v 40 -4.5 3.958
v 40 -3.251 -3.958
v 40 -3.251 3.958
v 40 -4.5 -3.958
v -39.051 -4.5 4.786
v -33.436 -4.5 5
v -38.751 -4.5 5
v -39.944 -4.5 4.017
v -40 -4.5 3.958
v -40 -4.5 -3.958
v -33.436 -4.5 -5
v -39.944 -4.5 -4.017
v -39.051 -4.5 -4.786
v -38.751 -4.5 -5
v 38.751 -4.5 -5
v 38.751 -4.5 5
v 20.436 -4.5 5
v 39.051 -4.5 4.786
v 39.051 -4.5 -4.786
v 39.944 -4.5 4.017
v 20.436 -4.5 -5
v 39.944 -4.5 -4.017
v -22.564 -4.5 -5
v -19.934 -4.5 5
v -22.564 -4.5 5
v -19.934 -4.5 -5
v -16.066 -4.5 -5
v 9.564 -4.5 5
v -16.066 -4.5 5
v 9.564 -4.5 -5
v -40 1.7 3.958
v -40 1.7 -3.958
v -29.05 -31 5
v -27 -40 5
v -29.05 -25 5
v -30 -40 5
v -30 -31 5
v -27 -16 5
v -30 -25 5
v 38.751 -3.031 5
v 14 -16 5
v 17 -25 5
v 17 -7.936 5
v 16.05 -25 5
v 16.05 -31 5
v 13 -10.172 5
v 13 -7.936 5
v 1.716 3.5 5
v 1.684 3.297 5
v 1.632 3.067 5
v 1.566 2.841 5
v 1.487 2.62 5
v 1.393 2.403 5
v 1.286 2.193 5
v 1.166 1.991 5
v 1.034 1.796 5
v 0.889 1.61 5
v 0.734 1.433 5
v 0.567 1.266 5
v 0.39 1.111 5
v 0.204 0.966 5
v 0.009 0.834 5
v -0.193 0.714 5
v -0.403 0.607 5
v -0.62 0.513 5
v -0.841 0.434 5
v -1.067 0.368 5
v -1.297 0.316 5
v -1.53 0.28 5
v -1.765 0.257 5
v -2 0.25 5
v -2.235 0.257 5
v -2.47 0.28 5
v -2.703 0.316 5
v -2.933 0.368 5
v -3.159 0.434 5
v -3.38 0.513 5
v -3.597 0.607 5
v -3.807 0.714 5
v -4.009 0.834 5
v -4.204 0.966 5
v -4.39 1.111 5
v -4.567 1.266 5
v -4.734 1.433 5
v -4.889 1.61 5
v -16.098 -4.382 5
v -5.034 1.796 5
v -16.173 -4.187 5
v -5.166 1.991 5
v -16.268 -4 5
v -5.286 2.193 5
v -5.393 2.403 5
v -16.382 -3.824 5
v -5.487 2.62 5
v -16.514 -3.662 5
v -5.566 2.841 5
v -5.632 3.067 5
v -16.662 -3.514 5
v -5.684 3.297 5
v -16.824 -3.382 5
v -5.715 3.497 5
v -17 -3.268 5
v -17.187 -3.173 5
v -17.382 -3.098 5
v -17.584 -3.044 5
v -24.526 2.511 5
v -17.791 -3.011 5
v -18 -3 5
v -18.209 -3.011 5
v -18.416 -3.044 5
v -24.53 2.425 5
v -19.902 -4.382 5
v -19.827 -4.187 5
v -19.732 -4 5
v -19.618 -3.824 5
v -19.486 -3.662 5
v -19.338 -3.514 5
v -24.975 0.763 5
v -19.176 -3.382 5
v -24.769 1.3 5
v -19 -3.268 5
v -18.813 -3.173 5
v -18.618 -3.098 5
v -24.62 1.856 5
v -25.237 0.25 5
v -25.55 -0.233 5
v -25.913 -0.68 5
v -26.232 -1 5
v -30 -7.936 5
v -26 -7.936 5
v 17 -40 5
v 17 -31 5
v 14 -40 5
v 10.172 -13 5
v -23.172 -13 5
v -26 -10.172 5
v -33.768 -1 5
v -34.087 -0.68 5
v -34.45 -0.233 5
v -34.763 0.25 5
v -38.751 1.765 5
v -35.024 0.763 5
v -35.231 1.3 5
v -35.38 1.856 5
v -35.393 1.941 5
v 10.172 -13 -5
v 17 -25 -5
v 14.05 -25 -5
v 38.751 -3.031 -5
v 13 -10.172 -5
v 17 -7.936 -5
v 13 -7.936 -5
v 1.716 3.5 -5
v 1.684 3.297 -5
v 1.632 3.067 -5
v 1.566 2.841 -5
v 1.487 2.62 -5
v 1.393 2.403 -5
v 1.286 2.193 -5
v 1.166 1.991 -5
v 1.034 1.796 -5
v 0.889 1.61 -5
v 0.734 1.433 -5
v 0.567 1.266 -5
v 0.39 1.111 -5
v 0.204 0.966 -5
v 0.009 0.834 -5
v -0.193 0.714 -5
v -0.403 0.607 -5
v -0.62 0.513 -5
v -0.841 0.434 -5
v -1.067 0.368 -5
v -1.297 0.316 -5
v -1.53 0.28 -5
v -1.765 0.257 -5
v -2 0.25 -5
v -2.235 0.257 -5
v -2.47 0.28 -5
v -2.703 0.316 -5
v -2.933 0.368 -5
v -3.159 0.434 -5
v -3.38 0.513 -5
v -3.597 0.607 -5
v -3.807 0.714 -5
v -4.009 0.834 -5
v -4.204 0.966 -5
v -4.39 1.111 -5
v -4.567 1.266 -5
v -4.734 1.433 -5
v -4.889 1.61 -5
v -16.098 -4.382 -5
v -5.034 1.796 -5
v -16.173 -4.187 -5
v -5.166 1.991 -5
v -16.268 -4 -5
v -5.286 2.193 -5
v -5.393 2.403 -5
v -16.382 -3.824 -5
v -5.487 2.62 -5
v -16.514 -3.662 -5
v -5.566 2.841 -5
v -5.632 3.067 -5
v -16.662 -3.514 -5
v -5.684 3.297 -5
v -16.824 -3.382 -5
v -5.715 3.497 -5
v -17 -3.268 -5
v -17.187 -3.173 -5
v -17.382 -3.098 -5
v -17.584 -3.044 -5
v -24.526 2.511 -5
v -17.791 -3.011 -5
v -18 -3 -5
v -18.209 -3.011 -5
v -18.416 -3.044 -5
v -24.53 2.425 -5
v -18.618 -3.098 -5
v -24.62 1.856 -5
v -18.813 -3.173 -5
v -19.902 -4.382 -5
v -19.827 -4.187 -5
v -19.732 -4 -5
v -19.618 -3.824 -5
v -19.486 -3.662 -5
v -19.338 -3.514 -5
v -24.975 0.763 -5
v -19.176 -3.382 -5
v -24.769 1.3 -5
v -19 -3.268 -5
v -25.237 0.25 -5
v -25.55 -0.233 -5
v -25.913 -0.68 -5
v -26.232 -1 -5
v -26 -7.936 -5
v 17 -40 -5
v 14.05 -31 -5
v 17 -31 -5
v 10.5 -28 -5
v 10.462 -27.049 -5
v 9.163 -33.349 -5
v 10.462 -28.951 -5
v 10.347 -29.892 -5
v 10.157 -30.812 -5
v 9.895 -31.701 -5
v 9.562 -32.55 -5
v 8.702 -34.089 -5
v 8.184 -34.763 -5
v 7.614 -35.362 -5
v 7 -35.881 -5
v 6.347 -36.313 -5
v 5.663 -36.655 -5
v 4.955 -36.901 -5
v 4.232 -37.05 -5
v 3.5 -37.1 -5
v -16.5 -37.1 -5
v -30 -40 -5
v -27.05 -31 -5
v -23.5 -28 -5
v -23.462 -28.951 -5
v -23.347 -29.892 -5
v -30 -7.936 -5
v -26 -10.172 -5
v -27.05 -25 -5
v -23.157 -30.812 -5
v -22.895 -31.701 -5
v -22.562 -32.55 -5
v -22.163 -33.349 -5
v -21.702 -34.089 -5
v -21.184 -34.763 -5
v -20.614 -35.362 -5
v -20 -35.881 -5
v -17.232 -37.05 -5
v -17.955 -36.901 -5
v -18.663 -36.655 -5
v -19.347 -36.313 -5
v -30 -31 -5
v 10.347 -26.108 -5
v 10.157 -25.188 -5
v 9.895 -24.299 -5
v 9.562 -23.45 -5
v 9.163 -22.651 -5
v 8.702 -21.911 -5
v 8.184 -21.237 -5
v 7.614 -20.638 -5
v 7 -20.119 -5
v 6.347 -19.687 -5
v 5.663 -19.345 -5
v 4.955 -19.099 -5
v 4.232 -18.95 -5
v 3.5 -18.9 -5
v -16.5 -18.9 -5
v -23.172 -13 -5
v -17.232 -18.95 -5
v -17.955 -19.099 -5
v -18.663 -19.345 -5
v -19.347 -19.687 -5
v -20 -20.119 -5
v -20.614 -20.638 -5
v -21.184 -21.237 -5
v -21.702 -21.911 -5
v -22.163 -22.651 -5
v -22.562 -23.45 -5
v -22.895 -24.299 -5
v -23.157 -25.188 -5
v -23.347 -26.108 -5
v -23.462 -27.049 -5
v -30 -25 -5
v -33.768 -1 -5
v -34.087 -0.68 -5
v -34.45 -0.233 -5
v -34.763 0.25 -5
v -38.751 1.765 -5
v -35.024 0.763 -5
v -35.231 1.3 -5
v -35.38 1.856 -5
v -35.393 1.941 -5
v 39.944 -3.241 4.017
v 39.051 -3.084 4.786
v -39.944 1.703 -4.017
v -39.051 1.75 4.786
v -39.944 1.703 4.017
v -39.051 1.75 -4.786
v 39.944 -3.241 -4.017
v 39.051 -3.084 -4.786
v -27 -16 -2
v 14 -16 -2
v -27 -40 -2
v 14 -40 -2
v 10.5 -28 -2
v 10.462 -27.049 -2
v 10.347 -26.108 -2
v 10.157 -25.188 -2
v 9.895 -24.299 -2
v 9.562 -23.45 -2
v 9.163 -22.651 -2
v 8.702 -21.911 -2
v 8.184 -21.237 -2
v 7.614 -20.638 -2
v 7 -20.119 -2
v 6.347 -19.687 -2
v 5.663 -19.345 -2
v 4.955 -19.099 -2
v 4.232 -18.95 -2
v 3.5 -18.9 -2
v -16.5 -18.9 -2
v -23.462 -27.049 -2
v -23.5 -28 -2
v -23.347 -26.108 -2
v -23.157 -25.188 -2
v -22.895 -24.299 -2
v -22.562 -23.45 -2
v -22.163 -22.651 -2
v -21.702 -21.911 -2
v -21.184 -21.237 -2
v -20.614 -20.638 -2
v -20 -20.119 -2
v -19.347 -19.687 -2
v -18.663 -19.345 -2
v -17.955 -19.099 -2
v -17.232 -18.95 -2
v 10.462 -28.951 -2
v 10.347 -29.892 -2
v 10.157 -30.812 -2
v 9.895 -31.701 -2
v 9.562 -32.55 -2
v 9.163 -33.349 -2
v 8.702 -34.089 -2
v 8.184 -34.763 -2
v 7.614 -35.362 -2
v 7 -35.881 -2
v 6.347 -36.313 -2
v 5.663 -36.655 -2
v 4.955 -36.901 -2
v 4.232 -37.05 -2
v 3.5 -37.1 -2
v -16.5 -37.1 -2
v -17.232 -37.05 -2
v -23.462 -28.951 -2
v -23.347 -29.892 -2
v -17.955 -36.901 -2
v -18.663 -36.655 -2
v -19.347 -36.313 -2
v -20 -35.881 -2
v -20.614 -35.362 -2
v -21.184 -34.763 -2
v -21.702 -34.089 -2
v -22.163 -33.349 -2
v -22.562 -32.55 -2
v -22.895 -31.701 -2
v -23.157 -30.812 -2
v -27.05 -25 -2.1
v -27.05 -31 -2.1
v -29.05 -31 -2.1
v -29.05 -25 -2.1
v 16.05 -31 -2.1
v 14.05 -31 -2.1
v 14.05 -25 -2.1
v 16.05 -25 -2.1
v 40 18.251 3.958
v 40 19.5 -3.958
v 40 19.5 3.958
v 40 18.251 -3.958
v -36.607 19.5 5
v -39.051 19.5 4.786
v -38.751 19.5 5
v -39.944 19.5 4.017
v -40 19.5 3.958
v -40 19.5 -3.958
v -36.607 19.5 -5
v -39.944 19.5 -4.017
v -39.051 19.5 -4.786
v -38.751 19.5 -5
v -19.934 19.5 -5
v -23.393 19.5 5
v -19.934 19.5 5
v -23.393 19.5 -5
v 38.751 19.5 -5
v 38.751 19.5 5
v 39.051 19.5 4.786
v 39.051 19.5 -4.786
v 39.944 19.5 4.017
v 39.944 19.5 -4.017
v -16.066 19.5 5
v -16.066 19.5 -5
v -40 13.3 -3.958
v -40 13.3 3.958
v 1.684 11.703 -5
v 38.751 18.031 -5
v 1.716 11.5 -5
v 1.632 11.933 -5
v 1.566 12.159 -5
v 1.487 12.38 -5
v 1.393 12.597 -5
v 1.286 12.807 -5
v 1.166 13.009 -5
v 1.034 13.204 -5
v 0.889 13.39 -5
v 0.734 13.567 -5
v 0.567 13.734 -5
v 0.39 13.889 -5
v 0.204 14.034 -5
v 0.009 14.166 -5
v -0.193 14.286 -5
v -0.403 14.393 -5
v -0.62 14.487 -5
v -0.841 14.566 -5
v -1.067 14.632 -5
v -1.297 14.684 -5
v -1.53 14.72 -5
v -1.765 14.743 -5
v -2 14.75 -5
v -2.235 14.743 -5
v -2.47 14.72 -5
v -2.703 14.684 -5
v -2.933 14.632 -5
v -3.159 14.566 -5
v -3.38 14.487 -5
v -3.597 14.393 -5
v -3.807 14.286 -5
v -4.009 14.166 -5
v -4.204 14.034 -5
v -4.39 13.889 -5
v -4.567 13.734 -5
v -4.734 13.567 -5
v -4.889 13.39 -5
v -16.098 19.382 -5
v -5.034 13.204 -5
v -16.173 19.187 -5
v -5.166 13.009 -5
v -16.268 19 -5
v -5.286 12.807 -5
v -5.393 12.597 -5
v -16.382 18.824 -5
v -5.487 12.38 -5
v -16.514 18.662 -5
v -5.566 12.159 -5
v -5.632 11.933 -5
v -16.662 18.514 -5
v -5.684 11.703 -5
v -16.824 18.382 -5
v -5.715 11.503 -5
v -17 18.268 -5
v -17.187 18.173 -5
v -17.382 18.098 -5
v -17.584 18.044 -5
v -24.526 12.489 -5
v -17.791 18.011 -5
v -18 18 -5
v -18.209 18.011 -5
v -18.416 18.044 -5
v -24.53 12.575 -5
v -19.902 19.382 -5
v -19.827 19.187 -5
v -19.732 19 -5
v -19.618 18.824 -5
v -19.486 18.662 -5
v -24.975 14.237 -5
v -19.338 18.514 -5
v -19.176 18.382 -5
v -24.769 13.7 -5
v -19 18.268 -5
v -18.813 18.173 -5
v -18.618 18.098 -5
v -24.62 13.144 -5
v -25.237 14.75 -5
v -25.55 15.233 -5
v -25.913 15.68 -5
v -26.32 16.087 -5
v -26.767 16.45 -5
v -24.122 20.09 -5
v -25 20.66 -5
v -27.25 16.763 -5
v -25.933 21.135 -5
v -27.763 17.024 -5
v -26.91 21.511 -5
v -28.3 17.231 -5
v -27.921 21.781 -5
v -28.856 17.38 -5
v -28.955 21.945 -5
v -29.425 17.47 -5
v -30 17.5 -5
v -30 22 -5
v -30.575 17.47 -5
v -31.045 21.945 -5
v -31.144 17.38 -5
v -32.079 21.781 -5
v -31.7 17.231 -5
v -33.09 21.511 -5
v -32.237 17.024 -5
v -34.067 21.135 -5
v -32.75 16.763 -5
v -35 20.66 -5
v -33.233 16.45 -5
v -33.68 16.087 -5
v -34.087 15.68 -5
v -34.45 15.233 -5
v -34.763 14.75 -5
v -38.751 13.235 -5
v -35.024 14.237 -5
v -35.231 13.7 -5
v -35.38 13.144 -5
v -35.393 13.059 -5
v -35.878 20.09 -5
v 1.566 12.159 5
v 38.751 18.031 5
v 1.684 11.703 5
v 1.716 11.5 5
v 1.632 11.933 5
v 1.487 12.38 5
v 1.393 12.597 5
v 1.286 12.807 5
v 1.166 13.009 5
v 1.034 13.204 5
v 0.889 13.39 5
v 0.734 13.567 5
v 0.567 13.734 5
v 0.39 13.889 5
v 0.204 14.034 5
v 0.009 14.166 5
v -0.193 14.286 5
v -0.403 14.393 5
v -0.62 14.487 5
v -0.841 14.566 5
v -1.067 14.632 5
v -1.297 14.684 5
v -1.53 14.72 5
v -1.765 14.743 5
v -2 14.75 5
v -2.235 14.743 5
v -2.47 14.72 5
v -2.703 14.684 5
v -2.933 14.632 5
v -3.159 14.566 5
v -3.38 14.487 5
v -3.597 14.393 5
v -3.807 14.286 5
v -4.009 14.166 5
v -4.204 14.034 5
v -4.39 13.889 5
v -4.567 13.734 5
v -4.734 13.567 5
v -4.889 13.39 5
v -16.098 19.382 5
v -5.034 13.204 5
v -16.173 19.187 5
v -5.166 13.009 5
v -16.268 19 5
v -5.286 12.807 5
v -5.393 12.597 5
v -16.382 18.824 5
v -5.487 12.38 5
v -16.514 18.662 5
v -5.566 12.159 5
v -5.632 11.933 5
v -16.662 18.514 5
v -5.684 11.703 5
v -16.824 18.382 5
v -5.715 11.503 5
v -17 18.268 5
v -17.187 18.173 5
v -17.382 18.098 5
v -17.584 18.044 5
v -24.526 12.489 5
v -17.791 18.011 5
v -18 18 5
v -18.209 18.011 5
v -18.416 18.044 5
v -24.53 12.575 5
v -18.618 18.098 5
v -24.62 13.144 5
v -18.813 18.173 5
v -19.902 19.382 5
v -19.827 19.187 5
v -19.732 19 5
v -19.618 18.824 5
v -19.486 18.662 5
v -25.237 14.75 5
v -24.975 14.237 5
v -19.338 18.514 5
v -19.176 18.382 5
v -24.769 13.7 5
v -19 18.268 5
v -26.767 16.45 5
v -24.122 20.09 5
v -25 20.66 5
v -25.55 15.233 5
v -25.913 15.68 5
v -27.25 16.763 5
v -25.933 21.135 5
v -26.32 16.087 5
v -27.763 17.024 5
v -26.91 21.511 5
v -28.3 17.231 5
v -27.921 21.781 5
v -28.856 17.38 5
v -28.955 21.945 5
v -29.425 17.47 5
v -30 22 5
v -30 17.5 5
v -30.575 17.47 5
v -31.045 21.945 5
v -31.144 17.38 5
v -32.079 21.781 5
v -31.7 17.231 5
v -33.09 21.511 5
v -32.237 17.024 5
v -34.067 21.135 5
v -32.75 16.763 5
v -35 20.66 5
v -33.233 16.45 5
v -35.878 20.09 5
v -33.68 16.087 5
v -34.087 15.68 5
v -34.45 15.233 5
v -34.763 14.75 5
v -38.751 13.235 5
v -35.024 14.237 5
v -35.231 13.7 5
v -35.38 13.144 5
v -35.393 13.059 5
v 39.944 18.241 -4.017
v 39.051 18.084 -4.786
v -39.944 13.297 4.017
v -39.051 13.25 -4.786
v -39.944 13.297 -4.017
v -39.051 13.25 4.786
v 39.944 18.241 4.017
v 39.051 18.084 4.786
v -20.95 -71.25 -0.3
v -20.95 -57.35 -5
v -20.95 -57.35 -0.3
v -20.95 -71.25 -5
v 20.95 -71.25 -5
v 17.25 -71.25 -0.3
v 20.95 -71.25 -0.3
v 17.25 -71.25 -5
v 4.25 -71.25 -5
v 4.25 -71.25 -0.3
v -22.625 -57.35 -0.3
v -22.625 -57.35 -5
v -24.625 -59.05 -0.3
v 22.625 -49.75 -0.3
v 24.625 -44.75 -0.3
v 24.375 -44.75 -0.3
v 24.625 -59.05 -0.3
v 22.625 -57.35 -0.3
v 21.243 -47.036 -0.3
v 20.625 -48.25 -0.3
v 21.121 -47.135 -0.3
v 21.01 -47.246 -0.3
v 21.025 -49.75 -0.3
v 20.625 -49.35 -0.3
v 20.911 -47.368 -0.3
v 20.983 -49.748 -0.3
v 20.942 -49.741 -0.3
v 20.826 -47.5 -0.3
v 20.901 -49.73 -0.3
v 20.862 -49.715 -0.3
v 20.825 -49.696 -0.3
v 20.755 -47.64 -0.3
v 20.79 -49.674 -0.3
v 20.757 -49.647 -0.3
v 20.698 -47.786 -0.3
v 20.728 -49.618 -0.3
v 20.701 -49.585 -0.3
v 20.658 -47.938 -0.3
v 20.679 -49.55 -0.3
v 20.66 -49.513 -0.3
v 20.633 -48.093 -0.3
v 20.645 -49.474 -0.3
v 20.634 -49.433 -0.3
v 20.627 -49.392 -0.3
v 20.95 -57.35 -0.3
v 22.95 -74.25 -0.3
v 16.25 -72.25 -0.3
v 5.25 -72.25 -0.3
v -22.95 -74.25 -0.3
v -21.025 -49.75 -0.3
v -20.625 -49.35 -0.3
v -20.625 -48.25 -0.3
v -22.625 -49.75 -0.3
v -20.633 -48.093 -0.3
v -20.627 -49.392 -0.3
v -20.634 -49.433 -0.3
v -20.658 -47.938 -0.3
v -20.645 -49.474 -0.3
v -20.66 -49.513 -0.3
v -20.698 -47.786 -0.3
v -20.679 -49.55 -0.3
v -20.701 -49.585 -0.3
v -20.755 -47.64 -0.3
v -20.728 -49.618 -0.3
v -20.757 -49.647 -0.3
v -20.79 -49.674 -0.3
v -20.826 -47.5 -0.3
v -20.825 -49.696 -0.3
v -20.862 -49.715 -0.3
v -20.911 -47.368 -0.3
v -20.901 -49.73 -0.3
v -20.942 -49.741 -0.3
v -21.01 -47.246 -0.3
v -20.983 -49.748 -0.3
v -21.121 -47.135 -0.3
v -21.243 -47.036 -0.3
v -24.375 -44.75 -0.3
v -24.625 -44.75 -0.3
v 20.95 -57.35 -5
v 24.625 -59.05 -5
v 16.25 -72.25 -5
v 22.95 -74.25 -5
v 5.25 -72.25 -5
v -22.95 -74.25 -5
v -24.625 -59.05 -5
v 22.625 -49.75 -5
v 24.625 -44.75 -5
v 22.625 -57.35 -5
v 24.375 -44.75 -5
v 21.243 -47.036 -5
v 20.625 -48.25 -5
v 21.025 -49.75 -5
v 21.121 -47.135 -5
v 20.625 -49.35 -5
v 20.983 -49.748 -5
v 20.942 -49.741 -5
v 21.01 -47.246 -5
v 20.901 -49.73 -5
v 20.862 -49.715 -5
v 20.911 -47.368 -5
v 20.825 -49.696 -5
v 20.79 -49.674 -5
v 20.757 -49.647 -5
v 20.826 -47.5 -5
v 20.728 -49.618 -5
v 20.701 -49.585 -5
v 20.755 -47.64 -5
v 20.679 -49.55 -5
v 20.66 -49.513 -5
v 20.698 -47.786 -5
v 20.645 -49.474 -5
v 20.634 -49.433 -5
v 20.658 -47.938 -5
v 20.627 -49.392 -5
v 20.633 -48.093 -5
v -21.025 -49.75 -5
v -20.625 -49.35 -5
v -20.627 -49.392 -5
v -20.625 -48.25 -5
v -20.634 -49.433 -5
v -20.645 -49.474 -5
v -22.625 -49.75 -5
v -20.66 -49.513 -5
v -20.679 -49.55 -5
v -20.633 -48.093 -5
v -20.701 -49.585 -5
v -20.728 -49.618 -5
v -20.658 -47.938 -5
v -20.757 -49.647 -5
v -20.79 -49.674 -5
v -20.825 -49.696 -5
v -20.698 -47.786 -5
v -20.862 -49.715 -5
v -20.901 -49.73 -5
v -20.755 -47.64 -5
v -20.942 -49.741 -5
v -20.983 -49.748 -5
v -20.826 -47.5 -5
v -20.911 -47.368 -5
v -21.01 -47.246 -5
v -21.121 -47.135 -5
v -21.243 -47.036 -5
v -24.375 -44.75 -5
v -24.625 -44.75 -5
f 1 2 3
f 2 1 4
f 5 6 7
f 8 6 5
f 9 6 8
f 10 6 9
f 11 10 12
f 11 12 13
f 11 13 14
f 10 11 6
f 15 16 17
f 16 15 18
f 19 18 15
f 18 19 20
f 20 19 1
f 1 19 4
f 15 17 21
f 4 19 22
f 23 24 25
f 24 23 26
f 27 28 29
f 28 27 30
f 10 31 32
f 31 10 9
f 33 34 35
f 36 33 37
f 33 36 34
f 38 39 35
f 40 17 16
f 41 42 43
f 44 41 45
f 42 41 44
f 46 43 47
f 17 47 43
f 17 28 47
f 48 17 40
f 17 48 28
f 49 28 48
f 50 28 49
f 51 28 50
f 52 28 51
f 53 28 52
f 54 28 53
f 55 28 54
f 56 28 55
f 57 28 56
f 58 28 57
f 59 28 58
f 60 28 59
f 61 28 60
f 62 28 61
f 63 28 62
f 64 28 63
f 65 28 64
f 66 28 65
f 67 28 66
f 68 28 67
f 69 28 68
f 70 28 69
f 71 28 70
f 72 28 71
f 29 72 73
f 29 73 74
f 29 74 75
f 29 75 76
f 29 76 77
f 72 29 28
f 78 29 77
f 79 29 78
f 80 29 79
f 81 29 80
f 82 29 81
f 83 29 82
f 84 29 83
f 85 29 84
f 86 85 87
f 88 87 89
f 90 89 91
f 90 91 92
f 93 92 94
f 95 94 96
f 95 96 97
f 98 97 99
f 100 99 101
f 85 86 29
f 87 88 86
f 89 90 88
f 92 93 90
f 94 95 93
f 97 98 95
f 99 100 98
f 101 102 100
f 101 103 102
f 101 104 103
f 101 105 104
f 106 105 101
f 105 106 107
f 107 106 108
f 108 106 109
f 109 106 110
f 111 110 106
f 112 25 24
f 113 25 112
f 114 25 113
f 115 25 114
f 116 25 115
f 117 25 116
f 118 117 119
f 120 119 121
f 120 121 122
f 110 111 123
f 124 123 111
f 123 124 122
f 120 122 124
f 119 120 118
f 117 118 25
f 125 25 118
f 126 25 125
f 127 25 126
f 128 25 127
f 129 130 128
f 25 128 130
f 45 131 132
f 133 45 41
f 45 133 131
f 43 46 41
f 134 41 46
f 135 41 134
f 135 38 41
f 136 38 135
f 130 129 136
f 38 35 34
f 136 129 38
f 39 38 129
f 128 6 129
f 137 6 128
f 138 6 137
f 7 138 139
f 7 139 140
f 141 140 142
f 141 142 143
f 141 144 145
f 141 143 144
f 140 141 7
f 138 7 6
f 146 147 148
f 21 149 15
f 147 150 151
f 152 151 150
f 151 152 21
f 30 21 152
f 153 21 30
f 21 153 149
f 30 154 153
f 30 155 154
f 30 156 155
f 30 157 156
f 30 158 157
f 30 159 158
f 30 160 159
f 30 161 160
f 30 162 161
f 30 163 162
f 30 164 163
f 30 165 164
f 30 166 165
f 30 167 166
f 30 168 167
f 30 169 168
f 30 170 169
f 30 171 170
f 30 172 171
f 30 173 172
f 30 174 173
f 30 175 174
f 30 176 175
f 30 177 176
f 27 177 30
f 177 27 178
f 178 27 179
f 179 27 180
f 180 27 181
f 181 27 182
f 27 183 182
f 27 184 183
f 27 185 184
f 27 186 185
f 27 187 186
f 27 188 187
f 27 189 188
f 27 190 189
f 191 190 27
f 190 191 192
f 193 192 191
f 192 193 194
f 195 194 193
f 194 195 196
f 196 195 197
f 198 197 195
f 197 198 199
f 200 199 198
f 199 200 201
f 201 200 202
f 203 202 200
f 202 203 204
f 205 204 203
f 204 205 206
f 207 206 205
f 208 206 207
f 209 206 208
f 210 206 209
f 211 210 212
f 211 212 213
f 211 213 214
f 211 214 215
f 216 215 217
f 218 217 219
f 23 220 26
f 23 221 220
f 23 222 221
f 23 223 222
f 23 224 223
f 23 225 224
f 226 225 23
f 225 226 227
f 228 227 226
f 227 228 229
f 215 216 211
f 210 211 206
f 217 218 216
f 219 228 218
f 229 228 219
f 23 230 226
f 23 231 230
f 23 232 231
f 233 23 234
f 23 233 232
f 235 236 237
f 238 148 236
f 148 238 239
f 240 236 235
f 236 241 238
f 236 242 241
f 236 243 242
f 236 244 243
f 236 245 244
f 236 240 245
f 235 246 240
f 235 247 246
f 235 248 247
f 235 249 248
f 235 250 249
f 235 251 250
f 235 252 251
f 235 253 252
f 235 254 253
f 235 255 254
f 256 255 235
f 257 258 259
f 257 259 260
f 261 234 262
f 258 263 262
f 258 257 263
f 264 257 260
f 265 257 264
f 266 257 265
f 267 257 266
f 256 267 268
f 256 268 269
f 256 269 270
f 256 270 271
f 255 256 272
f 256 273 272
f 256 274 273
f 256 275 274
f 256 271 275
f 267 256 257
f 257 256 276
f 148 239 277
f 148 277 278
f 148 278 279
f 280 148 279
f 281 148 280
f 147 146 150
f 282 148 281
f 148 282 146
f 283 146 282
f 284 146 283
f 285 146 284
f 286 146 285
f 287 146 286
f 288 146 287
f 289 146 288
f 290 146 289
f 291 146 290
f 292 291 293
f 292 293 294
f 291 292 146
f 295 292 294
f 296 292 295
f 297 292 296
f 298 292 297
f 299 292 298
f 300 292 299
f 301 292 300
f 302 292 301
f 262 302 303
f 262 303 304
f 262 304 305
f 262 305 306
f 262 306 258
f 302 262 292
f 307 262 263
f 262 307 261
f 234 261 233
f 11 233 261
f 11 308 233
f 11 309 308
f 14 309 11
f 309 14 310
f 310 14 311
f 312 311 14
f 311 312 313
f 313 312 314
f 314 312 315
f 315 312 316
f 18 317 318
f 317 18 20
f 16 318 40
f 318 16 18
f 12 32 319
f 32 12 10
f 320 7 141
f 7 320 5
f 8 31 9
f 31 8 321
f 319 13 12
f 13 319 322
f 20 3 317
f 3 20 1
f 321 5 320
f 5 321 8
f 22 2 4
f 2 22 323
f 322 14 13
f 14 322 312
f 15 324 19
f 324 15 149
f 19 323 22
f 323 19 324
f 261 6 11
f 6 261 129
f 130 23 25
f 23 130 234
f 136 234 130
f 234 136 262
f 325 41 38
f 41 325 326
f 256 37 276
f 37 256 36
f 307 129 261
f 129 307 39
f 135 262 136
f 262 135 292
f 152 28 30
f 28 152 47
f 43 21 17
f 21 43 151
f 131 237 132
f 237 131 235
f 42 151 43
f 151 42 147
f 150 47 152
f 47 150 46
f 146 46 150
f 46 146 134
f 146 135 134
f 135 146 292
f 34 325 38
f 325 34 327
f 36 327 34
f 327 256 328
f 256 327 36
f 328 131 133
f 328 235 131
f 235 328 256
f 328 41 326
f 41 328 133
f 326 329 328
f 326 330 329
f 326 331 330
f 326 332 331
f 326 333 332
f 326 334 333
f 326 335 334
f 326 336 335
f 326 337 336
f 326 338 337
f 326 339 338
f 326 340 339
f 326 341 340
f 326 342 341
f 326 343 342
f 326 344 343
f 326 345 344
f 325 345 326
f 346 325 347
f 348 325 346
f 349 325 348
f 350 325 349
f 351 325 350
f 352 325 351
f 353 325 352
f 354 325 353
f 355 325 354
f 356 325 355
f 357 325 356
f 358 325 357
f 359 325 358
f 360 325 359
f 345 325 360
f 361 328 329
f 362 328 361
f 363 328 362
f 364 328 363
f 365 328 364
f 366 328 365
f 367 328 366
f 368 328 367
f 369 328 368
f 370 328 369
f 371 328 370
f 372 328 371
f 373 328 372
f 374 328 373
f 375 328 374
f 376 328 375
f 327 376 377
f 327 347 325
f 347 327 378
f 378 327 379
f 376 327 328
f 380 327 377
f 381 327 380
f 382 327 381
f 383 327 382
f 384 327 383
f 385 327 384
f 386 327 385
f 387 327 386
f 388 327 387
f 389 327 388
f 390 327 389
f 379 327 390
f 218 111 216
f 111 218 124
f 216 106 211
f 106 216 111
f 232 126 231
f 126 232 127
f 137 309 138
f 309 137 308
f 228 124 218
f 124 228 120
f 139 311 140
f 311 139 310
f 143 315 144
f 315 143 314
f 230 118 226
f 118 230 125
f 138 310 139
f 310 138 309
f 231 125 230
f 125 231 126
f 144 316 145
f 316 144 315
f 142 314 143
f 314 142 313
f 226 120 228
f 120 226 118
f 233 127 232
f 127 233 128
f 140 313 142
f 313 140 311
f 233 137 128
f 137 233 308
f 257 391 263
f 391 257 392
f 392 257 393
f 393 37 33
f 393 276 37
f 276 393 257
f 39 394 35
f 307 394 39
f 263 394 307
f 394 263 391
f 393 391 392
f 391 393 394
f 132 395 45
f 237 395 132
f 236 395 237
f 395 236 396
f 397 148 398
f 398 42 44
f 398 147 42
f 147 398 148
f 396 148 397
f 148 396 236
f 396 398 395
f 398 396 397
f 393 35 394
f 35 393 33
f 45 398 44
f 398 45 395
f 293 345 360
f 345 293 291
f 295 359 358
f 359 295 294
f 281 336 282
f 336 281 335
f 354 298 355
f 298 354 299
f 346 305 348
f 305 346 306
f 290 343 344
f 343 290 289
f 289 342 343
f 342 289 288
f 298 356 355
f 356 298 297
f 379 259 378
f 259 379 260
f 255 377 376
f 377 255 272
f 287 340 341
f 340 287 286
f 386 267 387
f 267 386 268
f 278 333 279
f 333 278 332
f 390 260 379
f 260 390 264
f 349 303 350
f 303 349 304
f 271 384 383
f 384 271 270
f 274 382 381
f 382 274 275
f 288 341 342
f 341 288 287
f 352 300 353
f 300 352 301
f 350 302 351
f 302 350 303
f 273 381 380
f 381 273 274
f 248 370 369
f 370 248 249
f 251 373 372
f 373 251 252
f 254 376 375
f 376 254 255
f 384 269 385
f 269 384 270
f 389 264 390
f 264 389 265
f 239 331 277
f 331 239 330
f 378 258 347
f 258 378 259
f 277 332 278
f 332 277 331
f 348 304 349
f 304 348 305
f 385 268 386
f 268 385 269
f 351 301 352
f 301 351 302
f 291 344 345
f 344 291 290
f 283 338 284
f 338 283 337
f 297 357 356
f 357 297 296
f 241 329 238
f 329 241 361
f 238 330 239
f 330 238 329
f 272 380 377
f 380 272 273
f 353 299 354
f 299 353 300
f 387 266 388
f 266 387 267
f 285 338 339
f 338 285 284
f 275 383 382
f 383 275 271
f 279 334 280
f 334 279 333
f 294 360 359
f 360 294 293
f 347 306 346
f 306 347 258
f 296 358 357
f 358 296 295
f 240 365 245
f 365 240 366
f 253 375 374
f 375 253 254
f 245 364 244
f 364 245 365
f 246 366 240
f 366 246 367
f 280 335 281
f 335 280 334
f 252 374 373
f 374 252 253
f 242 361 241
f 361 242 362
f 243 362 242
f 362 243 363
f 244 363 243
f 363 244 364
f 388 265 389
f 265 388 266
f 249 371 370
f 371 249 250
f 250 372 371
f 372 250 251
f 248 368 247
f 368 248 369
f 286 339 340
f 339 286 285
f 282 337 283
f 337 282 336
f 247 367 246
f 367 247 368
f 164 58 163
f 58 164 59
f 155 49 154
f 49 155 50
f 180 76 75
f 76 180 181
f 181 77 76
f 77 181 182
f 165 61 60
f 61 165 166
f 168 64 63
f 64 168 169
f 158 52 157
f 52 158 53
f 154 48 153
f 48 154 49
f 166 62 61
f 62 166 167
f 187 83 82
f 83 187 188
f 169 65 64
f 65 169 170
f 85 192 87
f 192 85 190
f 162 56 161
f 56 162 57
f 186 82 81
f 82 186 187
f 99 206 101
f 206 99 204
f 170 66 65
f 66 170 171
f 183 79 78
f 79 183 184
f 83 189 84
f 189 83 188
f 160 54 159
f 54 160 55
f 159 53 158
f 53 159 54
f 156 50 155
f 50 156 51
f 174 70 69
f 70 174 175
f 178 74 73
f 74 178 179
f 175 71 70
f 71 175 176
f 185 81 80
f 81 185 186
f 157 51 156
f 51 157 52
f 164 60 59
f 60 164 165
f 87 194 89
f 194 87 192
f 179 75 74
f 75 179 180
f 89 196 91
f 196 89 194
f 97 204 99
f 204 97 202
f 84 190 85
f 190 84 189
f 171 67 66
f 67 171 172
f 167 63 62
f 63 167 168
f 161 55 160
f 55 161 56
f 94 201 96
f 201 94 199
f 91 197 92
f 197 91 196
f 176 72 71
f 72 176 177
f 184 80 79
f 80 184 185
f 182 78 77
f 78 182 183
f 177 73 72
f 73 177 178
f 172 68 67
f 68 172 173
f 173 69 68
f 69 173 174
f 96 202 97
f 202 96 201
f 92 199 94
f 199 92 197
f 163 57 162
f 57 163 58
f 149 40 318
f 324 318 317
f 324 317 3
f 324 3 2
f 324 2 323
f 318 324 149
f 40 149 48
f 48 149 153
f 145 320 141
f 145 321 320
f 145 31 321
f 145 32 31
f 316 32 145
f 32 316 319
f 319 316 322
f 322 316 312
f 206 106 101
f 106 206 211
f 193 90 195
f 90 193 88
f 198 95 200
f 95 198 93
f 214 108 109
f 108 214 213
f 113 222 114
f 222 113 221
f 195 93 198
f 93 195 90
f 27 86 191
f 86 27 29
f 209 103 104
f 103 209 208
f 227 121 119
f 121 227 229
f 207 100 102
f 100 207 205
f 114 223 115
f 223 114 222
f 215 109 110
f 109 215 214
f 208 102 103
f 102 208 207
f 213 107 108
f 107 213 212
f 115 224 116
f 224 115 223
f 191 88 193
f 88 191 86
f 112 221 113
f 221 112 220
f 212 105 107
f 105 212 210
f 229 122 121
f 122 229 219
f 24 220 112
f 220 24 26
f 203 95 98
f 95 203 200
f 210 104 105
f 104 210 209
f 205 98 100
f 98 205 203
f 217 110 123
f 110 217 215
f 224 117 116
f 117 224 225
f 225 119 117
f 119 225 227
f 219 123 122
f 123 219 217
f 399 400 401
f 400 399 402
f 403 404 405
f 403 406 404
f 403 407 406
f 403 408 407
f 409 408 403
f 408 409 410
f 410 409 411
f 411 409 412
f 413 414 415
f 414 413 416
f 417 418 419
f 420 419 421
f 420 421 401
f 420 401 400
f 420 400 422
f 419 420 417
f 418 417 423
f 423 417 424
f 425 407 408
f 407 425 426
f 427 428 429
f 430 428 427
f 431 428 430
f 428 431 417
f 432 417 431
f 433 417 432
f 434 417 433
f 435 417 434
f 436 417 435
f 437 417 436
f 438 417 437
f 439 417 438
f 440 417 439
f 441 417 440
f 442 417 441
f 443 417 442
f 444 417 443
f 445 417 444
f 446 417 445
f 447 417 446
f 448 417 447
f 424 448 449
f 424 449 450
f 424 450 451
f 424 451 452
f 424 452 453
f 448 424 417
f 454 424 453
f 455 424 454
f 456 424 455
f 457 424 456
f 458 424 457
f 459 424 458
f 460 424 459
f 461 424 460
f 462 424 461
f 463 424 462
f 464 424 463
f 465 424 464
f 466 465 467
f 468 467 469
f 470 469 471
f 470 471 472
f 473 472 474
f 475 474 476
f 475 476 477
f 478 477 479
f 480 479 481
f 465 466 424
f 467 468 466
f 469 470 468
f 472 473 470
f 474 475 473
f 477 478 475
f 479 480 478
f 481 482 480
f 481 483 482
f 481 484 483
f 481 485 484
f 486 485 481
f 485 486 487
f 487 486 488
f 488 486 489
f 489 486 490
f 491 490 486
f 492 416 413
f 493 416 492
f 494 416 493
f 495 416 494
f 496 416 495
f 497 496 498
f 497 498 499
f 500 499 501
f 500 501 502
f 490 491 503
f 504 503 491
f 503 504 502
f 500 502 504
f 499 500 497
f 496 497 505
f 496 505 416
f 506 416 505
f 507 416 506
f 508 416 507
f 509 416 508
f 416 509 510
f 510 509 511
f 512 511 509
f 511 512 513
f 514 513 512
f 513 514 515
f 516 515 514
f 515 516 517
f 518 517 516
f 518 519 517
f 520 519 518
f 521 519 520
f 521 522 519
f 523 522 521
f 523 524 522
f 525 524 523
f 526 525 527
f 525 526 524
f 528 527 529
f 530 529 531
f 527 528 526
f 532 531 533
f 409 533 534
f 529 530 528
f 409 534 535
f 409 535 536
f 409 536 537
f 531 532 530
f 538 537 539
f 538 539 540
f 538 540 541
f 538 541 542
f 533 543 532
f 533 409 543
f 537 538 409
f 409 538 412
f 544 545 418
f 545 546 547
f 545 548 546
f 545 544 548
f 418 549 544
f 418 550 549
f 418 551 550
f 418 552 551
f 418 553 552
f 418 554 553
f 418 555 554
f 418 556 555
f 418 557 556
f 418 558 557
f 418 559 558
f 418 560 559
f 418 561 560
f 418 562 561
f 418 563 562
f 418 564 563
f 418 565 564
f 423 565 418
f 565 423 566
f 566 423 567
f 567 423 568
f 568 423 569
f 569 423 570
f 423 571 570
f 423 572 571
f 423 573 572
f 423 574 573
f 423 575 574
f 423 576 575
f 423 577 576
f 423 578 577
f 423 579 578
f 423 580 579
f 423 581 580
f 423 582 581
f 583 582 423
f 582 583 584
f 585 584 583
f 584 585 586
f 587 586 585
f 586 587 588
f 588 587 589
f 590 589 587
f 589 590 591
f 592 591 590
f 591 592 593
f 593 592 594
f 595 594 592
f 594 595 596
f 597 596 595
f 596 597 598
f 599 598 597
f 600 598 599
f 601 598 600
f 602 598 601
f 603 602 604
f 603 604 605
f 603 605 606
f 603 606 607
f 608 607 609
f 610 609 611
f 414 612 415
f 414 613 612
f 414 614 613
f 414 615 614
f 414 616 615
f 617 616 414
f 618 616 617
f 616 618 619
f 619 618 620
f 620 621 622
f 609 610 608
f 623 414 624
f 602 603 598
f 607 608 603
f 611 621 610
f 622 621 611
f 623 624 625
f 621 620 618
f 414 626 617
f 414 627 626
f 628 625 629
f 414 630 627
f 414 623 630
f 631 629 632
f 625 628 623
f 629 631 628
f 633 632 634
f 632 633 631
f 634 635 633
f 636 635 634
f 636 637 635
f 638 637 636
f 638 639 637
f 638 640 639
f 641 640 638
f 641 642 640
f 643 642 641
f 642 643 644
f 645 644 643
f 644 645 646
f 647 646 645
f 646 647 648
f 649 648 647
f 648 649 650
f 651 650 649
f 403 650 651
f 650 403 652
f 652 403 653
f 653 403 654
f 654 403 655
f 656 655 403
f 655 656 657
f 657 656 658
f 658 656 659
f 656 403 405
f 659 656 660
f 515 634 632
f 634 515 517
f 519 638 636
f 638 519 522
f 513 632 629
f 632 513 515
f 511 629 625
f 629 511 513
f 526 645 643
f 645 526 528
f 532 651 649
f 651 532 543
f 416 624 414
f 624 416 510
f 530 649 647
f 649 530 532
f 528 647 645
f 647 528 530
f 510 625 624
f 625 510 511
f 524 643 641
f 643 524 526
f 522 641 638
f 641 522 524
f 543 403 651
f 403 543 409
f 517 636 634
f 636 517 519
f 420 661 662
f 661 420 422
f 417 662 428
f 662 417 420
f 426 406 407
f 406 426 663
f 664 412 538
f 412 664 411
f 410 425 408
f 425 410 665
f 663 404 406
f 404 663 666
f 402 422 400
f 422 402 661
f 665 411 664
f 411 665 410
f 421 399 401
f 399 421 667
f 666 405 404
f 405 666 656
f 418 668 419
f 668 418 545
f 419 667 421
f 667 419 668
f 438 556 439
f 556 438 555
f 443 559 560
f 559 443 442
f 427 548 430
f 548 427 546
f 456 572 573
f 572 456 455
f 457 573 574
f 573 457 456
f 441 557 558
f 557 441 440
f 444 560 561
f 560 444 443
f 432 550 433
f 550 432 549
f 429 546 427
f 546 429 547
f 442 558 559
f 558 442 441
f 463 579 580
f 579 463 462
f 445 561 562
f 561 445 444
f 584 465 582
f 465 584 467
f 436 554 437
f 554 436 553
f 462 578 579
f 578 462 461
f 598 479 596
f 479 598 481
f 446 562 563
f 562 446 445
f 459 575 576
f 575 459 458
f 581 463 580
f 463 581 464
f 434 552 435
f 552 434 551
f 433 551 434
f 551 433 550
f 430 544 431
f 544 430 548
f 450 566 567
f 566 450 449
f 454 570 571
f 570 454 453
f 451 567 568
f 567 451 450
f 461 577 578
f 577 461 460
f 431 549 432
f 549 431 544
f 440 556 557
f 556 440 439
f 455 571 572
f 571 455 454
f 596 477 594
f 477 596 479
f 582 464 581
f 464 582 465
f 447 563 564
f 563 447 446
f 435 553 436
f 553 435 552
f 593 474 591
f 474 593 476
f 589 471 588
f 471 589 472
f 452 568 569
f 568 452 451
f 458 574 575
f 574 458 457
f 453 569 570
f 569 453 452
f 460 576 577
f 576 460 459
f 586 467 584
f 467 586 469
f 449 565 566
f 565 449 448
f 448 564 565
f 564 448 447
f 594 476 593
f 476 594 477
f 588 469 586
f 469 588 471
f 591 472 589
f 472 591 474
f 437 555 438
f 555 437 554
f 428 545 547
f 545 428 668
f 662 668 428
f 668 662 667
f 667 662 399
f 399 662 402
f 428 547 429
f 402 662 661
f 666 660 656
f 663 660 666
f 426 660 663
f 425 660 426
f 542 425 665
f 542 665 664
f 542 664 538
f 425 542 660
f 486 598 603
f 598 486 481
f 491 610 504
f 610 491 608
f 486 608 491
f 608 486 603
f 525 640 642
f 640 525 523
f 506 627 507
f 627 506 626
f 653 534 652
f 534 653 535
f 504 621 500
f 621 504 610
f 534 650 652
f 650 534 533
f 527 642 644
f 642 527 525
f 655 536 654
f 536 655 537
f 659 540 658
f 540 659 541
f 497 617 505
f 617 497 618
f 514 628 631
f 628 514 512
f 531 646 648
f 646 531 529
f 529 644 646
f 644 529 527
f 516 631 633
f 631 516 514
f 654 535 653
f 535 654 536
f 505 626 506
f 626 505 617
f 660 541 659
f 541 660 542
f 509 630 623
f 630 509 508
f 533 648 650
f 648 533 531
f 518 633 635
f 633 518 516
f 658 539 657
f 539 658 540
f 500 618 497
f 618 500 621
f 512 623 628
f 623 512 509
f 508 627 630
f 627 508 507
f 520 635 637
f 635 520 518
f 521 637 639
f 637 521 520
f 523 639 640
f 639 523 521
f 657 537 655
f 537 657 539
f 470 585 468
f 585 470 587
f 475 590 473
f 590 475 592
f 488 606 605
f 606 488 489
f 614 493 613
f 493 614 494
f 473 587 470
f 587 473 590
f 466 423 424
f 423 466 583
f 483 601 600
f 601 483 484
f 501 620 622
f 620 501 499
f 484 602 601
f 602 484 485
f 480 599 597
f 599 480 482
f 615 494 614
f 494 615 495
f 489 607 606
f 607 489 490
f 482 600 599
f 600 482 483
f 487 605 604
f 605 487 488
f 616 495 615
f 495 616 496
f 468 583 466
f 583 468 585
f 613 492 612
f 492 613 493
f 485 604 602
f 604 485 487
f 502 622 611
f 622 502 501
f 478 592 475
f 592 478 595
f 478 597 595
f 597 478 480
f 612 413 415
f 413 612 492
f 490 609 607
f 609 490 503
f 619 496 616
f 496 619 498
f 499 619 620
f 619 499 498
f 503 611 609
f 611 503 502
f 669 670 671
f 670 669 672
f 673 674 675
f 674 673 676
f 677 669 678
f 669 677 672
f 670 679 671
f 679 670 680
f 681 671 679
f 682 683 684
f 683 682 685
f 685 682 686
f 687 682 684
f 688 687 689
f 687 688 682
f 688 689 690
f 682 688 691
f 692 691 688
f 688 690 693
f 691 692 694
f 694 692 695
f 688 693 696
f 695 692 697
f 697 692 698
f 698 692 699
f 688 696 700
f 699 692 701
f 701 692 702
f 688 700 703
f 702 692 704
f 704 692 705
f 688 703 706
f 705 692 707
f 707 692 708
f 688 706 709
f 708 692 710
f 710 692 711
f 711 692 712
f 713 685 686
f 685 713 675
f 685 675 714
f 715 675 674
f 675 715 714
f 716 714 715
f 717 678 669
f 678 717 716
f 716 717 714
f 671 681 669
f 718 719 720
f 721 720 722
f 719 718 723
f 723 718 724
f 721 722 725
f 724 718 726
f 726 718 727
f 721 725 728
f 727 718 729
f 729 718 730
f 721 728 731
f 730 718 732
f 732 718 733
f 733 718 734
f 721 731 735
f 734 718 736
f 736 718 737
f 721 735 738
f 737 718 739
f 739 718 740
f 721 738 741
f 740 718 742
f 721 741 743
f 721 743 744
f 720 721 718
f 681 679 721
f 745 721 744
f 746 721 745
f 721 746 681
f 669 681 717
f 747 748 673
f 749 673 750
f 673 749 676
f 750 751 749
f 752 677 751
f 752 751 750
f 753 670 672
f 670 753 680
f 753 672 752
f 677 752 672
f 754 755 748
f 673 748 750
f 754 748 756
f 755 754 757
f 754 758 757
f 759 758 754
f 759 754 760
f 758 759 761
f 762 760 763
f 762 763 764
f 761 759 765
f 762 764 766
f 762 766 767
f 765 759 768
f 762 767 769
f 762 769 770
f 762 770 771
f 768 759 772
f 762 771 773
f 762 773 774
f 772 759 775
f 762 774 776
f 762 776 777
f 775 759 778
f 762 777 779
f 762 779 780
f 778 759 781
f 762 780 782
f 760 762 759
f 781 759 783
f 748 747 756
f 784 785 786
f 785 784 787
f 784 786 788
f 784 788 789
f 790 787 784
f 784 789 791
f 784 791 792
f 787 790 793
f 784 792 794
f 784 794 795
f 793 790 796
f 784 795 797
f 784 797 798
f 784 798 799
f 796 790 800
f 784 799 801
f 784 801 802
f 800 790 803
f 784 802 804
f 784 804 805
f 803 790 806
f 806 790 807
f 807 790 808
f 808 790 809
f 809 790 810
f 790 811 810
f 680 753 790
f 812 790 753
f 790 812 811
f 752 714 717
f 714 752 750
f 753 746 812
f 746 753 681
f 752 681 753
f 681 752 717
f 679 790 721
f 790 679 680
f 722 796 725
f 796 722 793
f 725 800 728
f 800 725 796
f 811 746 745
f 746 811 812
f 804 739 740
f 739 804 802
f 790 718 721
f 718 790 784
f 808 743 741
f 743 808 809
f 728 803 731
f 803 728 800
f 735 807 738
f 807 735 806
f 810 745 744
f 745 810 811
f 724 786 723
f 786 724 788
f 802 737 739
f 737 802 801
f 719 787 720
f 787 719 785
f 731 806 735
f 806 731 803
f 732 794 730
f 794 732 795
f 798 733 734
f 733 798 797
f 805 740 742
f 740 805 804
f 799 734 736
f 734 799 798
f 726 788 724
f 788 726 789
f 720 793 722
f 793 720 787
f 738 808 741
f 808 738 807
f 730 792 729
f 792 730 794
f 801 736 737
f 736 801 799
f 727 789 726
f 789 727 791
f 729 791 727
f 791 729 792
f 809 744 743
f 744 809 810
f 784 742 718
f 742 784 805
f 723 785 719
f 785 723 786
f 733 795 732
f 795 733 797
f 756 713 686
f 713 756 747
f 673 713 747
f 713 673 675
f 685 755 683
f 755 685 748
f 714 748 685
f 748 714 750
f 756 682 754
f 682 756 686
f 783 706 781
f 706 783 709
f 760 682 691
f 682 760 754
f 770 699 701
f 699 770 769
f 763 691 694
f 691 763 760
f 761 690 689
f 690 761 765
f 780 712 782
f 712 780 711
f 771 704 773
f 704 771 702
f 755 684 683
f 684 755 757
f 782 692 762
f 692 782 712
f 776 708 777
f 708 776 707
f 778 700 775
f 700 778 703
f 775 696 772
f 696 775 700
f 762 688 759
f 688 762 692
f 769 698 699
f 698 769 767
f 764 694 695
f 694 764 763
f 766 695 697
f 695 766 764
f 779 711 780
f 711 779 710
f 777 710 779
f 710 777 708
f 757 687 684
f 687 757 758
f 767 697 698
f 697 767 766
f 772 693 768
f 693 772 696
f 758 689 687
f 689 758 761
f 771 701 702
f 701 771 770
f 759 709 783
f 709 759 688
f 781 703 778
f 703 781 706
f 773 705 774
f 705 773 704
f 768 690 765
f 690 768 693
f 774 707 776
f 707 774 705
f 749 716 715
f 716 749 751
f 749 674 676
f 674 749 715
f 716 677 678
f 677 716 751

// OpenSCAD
// gopro fix ti phantom for moving

$fn=60;

it=[-1,1];

rotate ([90,0,0]) fixer();
translate ([0,15,0]) rotate ([-90,0,0]) fixer(ext=true);
translate([0, -60, -2.65]) rotate([90, 0, 0]) color("orange") ribbon(); 

// simulation
*translate([-6.5, -28, 8]) color("orange") ribbon(); 

module fixer(ext) {
	difference () 
	{
		fixer_plain(ext);
		fixer_void(ext);
	}
}

module fixer_plain(ext)
{
	intersection () 
	{
		union()
		{
			cube ([80,10,9],center=true);
			if(ext)
			{
				translate ([-30, 0, -3]) rotate ([90,0,0]) cylinder (r=10, h=10, center=true);
			}
		}
		scale ([42,13,14]) cylinder (r=1, h=1, center=true,$fn=100);
	}
	if(!ext)
	{
		// join
		translate([-6.5, 0, 0]) for(j=it) translate([j*43/2, 0, 0]) 
		{
			translate ([0, 0, 9]) cube([4, 10, 14], true);
			for(i=it) translate ([i*2, 0, 4.4]) rotate([0, 45, 0]) cube([5, 10, 5], true);
			translate ([j*-2, 0, 15.5-2.5]) rotate([0, 45, 0]) cube([4, 10, 4], center=true);
		}
		
		// gopro
		%translate ([-12.75, 0, 14.5]) cube([24.5, 10, 3], center=true);
		translate ([-6.5, 0, 14.5]) cube([47, 10, 3], center=true);
		translate ([-28.5, 0, 28]) cube([3, 10, 24], center=true);
		translate ([15.5, 0, 28]) cube([3, 10, 24], center=true);
		translate ([-6.5, -3.5, 28]) cube([41, 3, 24], center=true);
		%translate ([-6.5, 8.5, 28]) cube([41, 21, 24], center=true);
	}
}

module fixer_void(ext)
{
	translate ([-40+38,0,-4]) rotate ([90,0,0]) cylinder (r=3.75,h=11,center=true,$fn=100);
	translate ([22,0,-5]) rotate ([0,-10,0]) cube ([45,11,10],center=true);
	translate ([-22,0,-7.65]) rotate ([0,3,0]) cube ([40,11,10],center=true);

	if(ext)
	{
		translate ([-30, 0, -3]) rotate ([90,0,0]) cylinder (r=5.5, h=11, center=true);
	}
	else
	{
		translate([-6.5, -3, 28]) scale([1, 1, 1.3]) hull() for(i=it) translate([i*10, 0, 0]) rotate([90, 0, 0]) cylinder(r=7, h=6, center=true);
		
		intersection()
		{
			translate ([-30, 0, -3]) rotate ([90,0,0]) cylinder (r=5.5, h=11, center=true);
			translate ([-30, 0, -1.5]) cube([11, 12, 5], true);
		}
		translate([-6.5, -3.6, 28]) for(i=it) translate([i*44.1/2, 0, 0]) cube([3, 3, 6], true);
		translate([-6.5, -3.6, 28]) for(i=it) translate([i*46.1/2, 0, 0]) cube([1, 20, 6], true);
	}

	translate ([-18,0,5]) rotate ([90,0,0]) cylinder(r=2, h=11, center=true);
}


module ribbon()
{
	difference()
	{
		ribbon_plain();
		ribbon_void();
	}
}
module ribbon_plain()
{
	translate([0, 0, 12.75]) cube([45.5, 4.7, 3], true);
	for(i=it) 
	{
		translate([i*43.9/2, 0, 4.3]) cube([2, 4.7, 13.9], true);
		hull()
		{
			translate([i*43.9/2, 0, 14.2]) cube([2, 4.7, .1], true);
			translate([i*46.85/2, 0, -1]) cube([2.4, 4.7, .1], true);
		}
		translate([i*47.25/2, 0, -6]) cube([2, 4.7, 10], true);
		*%translate([i*45.25/2, 0, -11.75]) cube([4, 4.7, 3], true);
		hull()
		{
			translate([i*49/2, 0, -12.75]) cube([.25, 4.7, 5], true);
			translate([i*44.25/2, 0, -11.75]) rotate([90, 0, 0]) cylinder(r=3/2, h=4.7, center=true);
			translate([i*42.05/2, 0, -10.65]) rotate([90, 0, 0]) cylinder(r=.4, h=4.7, center=true);
		}
	}
}

module ribbon_void()
{
	hull()
	{
		translate([45.5/2-5.5-13/2, 0, 11.2]) cube([13, 5, .1], true);
		translate([45.5/2-5.5-13/2, 0, 12.2]) cube([11, 5, .1], true);
	}
}
